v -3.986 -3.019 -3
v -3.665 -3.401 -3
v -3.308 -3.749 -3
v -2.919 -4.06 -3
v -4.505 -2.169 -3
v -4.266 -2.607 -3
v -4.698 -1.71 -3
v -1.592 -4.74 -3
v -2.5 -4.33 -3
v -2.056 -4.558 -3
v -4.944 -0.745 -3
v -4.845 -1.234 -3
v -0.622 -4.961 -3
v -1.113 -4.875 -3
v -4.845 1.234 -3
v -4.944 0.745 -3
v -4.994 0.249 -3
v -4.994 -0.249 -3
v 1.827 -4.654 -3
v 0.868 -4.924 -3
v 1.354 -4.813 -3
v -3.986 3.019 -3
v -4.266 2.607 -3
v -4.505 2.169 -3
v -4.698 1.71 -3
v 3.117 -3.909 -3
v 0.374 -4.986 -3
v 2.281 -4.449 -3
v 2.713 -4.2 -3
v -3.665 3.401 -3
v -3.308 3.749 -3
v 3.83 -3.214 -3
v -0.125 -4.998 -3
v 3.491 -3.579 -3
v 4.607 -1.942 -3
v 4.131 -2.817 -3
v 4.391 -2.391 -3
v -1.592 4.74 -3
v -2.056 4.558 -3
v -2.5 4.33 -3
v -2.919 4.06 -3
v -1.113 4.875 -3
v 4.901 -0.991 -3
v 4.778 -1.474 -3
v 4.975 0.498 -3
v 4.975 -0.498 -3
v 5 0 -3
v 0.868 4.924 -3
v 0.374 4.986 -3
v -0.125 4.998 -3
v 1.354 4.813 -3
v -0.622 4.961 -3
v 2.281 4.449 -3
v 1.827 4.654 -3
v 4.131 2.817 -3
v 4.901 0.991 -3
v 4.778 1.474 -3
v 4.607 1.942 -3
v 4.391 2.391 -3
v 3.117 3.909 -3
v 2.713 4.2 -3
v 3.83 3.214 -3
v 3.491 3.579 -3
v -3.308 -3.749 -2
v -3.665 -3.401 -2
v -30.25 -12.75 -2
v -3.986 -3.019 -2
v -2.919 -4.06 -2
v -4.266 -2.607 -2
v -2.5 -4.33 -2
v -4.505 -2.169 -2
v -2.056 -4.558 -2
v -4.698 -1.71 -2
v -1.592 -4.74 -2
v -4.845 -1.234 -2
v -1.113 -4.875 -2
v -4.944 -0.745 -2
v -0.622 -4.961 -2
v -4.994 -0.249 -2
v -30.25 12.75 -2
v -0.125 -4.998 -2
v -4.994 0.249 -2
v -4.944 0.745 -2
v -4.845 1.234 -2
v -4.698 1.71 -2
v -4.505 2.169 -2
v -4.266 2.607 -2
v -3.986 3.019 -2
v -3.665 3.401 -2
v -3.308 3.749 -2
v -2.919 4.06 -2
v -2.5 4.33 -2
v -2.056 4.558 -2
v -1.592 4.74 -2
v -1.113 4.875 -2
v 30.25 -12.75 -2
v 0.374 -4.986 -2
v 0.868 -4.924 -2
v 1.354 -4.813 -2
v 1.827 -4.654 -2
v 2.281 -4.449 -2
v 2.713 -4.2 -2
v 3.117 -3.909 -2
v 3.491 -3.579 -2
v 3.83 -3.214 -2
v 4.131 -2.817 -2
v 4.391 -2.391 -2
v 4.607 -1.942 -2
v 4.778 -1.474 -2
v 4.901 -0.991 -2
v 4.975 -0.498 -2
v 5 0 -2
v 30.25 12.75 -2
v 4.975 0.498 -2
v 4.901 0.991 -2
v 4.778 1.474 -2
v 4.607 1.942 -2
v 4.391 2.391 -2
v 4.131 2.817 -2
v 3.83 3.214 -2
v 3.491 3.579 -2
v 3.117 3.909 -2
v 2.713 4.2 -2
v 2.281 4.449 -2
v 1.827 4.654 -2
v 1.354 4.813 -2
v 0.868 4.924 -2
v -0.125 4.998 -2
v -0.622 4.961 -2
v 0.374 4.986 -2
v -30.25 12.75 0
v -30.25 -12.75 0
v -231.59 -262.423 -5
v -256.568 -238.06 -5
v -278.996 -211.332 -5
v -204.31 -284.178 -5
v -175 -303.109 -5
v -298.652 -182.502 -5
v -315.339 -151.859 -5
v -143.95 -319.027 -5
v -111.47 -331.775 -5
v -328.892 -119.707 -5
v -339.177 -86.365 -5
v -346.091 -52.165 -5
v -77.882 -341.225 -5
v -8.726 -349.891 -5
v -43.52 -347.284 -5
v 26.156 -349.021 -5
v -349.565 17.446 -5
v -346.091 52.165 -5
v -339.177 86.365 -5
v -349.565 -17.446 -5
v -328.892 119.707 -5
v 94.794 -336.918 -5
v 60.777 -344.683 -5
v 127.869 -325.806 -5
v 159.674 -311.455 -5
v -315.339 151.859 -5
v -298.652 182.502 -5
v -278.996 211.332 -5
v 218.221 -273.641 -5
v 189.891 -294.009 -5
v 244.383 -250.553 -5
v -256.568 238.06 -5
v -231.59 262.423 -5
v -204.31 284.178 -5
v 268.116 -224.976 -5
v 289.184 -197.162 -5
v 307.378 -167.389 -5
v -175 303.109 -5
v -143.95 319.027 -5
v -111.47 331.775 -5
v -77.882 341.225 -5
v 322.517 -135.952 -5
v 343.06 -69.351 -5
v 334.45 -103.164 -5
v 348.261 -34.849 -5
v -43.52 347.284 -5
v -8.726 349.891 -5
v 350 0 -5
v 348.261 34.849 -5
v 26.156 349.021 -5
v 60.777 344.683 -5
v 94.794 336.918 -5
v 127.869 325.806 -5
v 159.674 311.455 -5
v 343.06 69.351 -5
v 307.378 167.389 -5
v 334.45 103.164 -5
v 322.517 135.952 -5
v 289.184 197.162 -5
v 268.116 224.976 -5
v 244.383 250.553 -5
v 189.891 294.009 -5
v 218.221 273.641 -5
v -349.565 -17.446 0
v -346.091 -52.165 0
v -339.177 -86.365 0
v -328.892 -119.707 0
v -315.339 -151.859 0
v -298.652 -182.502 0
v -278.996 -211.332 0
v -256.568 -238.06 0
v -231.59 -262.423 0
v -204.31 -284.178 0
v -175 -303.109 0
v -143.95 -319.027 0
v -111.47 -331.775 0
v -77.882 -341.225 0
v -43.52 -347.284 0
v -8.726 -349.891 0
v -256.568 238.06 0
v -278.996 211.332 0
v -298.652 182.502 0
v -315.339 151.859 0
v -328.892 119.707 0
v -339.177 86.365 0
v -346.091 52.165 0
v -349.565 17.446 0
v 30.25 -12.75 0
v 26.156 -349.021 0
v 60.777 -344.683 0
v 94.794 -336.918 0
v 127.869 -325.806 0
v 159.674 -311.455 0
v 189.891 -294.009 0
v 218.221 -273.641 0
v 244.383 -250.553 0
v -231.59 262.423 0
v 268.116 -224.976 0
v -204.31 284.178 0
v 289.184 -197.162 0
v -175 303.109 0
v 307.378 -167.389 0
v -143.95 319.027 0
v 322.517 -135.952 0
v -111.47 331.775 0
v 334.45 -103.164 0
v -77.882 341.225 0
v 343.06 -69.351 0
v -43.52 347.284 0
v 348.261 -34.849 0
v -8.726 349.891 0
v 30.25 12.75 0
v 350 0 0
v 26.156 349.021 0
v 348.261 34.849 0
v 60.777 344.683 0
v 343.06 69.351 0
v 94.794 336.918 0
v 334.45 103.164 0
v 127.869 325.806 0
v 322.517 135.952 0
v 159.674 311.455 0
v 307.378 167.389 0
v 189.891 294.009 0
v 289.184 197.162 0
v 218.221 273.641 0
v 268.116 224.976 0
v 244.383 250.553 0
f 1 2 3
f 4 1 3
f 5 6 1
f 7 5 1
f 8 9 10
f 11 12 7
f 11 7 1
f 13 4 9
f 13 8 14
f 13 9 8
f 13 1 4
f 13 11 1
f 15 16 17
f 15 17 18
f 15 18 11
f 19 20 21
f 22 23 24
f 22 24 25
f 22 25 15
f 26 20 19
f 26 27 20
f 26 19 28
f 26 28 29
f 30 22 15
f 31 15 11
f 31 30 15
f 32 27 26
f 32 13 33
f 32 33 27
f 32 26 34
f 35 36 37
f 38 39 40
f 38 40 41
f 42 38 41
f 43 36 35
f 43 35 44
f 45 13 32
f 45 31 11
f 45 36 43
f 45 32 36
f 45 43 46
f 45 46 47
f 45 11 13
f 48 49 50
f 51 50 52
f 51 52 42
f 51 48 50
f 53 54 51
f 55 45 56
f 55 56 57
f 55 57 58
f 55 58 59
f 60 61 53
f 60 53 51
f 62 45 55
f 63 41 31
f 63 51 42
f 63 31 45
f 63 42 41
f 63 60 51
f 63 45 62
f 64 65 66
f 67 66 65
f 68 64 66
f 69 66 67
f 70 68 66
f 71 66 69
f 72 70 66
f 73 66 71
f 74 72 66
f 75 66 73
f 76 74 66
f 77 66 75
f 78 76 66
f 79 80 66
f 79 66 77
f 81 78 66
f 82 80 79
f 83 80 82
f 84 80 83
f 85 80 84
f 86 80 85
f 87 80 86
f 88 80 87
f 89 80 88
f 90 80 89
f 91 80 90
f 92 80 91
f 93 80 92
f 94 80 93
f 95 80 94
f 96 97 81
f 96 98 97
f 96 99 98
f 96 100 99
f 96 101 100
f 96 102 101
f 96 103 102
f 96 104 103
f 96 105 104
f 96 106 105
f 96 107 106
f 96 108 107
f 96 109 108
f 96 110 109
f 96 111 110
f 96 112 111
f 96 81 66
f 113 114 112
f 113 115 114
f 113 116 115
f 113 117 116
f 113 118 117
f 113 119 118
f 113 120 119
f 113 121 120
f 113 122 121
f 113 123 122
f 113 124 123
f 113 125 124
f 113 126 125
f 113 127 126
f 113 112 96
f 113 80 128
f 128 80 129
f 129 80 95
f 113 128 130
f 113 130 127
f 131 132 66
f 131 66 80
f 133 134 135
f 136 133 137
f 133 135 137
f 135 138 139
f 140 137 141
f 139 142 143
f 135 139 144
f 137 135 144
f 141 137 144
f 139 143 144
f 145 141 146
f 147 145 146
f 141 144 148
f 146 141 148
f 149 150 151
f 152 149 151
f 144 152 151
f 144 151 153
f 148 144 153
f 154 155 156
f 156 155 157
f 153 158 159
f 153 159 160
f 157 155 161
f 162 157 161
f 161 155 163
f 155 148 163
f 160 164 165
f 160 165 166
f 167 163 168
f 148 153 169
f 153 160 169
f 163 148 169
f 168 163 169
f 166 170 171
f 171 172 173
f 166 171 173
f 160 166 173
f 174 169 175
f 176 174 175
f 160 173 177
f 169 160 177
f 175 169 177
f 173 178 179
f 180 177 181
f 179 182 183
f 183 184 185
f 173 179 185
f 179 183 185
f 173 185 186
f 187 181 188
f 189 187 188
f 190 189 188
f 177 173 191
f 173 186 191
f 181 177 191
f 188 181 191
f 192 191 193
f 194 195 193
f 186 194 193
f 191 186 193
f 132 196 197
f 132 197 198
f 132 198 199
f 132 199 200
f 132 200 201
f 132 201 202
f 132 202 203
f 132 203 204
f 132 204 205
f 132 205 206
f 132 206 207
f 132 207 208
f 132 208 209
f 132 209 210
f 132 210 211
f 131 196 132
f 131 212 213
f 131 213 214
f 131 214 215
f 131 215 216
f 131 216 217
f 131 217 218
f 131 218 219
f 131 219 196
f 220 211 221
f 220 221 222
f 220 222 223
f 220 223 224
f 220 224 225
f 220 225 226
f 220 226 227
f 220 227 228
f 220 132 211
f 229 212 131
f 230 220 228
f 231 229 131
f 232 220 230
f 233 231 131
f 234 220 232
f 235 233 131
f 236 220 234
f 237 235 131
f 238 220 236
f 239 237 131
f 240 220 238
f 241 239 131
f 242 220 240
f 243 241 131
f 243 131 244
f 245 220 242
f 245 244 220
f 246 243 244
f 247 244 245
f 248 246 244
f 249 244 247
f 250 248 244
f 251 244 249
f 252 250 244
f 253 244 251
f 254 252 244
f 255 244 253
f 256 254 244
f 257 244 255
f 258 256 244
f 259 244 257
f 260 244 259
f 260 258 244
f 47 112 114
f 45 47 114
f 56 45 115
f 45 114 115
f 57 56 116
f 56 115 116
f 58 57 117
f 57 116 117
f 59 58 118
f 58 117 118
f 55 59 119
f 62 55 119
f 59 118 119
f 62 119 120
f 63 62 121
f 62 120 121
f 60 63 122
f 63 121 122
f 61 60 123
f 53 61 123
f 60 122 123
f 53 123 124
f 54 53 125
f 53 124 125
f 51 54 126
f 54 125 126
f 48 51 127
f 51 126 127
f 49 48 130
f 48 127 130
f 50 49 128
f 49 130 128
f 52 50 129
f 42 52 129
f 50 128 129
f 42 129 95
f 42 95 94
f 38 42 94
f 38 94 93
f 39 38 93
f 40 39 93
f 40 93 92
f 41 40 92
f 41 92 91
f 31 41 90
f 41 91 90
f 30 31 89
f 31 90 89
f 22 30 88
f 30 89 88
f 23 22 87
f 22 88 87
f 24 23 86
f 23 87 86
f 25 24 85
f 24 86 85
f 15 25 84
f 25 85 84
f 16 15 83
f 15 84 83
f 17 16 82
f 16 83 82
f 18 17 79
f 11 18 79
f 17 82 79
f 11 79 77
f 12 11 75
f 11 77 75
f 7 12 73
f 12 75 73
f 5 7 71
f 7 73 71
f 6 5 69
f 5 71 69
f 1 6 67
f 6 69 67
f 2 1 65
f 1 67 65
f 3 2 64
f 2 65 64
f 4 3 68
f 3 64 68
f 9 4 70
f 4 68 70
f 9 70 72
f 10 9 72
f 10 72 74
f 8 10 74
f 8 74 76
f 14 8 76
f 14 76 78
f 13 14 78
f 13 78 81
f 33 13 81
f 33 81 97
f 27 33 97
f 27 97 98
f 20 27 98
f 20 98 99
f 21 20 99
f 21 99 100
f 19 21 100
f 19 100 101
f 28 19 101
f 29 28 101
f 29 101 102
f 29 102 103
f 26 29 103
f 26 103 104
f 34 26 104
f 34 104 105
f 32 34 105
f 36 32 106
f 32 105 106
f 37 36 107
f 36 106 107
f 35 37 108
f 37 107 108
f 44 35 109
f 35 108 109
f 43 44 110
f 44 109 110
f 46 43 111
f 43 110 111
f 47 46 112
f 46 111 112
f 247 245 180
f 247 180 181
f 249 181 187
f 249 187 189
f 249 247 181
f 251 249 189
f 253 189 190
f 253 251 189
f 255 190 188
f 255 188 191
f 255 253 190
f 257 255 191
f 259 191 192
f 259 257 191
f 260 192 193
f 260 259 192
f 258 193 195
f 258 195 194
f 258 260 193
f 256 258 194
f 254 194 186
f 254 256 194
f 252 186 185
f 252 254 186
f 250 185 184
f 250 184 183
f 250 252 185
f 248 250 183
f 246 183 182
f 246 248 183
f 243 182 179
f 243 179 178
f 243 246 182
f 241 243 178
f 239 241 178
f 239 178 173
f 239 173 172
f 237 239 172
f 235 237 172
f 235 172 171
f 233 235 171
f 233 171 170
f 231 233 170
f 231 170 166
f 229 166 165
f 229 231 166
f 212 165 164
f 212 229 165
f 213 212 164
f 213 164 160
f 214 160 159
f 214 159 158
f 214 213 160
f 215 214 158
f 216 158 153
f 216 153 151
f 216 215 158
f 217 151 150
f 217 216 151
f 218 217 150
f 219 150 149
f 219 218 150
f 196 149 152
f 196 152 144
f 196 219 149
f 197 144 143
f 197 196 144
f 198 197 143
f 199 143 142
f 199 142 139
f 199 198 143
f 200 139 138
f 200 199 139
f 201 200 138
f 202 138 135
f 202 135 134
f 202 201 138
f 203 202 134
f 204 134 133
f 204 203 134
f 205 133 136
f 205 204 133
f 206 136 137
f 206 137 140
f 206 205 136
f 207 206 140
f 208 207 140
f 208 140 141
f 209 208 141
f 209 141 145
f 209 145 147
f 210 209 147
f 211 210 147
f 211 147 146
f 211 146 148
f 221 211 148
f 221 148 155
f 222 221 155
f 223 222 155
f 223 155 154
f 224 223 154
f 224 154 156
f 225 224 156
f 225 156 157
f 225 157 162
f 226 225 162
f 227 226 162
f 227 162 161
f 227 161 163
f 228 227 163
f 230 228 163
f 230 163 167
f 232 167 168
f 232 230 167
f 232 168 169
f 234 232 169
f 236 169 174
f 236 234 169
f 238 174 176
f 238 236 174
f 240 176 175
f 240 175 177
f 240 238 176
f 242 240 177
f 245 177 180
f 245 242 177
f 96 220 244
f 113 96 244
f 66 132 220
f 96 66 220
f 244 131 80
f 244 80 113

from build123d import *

# Parameters (mm, degrees)
F0_R     = 350
F0_W     = 60.5
F0_H     = 25.5
F1_DEPTH = 5
F2_DEPTH = 2
F3_R     = 5
F4_DEPTH = 1


with BuildPart() as f1:
    # F0 (on Top) → F1 (new body)
    with BuildSketch(Plane.XY):
        Circle(F0_R)
        Rectangle(F0_W, F0_H, mode=Mode.SUBTRACT)
        Rectangle(F0_W, F0_H)
    extrude(amount=-F1_DEPTH)

    # F0 (on Top) → F2 (cut)
    with BuildSketch(Plane.XY):
        Rectangle(F0_W, F0_H)
    extrude(amount=-F2_DEPTH, mode=Mode.SUBTRACT)

    # F3 (on face) → F4 (cut)
    with BuildSketch(Plane.XY.offset(-2)):
        Circle(F3_R)
    extrude(amount=-F4_DEPTH, mode=Mode.SUBTRACT)


solid = f1.part
